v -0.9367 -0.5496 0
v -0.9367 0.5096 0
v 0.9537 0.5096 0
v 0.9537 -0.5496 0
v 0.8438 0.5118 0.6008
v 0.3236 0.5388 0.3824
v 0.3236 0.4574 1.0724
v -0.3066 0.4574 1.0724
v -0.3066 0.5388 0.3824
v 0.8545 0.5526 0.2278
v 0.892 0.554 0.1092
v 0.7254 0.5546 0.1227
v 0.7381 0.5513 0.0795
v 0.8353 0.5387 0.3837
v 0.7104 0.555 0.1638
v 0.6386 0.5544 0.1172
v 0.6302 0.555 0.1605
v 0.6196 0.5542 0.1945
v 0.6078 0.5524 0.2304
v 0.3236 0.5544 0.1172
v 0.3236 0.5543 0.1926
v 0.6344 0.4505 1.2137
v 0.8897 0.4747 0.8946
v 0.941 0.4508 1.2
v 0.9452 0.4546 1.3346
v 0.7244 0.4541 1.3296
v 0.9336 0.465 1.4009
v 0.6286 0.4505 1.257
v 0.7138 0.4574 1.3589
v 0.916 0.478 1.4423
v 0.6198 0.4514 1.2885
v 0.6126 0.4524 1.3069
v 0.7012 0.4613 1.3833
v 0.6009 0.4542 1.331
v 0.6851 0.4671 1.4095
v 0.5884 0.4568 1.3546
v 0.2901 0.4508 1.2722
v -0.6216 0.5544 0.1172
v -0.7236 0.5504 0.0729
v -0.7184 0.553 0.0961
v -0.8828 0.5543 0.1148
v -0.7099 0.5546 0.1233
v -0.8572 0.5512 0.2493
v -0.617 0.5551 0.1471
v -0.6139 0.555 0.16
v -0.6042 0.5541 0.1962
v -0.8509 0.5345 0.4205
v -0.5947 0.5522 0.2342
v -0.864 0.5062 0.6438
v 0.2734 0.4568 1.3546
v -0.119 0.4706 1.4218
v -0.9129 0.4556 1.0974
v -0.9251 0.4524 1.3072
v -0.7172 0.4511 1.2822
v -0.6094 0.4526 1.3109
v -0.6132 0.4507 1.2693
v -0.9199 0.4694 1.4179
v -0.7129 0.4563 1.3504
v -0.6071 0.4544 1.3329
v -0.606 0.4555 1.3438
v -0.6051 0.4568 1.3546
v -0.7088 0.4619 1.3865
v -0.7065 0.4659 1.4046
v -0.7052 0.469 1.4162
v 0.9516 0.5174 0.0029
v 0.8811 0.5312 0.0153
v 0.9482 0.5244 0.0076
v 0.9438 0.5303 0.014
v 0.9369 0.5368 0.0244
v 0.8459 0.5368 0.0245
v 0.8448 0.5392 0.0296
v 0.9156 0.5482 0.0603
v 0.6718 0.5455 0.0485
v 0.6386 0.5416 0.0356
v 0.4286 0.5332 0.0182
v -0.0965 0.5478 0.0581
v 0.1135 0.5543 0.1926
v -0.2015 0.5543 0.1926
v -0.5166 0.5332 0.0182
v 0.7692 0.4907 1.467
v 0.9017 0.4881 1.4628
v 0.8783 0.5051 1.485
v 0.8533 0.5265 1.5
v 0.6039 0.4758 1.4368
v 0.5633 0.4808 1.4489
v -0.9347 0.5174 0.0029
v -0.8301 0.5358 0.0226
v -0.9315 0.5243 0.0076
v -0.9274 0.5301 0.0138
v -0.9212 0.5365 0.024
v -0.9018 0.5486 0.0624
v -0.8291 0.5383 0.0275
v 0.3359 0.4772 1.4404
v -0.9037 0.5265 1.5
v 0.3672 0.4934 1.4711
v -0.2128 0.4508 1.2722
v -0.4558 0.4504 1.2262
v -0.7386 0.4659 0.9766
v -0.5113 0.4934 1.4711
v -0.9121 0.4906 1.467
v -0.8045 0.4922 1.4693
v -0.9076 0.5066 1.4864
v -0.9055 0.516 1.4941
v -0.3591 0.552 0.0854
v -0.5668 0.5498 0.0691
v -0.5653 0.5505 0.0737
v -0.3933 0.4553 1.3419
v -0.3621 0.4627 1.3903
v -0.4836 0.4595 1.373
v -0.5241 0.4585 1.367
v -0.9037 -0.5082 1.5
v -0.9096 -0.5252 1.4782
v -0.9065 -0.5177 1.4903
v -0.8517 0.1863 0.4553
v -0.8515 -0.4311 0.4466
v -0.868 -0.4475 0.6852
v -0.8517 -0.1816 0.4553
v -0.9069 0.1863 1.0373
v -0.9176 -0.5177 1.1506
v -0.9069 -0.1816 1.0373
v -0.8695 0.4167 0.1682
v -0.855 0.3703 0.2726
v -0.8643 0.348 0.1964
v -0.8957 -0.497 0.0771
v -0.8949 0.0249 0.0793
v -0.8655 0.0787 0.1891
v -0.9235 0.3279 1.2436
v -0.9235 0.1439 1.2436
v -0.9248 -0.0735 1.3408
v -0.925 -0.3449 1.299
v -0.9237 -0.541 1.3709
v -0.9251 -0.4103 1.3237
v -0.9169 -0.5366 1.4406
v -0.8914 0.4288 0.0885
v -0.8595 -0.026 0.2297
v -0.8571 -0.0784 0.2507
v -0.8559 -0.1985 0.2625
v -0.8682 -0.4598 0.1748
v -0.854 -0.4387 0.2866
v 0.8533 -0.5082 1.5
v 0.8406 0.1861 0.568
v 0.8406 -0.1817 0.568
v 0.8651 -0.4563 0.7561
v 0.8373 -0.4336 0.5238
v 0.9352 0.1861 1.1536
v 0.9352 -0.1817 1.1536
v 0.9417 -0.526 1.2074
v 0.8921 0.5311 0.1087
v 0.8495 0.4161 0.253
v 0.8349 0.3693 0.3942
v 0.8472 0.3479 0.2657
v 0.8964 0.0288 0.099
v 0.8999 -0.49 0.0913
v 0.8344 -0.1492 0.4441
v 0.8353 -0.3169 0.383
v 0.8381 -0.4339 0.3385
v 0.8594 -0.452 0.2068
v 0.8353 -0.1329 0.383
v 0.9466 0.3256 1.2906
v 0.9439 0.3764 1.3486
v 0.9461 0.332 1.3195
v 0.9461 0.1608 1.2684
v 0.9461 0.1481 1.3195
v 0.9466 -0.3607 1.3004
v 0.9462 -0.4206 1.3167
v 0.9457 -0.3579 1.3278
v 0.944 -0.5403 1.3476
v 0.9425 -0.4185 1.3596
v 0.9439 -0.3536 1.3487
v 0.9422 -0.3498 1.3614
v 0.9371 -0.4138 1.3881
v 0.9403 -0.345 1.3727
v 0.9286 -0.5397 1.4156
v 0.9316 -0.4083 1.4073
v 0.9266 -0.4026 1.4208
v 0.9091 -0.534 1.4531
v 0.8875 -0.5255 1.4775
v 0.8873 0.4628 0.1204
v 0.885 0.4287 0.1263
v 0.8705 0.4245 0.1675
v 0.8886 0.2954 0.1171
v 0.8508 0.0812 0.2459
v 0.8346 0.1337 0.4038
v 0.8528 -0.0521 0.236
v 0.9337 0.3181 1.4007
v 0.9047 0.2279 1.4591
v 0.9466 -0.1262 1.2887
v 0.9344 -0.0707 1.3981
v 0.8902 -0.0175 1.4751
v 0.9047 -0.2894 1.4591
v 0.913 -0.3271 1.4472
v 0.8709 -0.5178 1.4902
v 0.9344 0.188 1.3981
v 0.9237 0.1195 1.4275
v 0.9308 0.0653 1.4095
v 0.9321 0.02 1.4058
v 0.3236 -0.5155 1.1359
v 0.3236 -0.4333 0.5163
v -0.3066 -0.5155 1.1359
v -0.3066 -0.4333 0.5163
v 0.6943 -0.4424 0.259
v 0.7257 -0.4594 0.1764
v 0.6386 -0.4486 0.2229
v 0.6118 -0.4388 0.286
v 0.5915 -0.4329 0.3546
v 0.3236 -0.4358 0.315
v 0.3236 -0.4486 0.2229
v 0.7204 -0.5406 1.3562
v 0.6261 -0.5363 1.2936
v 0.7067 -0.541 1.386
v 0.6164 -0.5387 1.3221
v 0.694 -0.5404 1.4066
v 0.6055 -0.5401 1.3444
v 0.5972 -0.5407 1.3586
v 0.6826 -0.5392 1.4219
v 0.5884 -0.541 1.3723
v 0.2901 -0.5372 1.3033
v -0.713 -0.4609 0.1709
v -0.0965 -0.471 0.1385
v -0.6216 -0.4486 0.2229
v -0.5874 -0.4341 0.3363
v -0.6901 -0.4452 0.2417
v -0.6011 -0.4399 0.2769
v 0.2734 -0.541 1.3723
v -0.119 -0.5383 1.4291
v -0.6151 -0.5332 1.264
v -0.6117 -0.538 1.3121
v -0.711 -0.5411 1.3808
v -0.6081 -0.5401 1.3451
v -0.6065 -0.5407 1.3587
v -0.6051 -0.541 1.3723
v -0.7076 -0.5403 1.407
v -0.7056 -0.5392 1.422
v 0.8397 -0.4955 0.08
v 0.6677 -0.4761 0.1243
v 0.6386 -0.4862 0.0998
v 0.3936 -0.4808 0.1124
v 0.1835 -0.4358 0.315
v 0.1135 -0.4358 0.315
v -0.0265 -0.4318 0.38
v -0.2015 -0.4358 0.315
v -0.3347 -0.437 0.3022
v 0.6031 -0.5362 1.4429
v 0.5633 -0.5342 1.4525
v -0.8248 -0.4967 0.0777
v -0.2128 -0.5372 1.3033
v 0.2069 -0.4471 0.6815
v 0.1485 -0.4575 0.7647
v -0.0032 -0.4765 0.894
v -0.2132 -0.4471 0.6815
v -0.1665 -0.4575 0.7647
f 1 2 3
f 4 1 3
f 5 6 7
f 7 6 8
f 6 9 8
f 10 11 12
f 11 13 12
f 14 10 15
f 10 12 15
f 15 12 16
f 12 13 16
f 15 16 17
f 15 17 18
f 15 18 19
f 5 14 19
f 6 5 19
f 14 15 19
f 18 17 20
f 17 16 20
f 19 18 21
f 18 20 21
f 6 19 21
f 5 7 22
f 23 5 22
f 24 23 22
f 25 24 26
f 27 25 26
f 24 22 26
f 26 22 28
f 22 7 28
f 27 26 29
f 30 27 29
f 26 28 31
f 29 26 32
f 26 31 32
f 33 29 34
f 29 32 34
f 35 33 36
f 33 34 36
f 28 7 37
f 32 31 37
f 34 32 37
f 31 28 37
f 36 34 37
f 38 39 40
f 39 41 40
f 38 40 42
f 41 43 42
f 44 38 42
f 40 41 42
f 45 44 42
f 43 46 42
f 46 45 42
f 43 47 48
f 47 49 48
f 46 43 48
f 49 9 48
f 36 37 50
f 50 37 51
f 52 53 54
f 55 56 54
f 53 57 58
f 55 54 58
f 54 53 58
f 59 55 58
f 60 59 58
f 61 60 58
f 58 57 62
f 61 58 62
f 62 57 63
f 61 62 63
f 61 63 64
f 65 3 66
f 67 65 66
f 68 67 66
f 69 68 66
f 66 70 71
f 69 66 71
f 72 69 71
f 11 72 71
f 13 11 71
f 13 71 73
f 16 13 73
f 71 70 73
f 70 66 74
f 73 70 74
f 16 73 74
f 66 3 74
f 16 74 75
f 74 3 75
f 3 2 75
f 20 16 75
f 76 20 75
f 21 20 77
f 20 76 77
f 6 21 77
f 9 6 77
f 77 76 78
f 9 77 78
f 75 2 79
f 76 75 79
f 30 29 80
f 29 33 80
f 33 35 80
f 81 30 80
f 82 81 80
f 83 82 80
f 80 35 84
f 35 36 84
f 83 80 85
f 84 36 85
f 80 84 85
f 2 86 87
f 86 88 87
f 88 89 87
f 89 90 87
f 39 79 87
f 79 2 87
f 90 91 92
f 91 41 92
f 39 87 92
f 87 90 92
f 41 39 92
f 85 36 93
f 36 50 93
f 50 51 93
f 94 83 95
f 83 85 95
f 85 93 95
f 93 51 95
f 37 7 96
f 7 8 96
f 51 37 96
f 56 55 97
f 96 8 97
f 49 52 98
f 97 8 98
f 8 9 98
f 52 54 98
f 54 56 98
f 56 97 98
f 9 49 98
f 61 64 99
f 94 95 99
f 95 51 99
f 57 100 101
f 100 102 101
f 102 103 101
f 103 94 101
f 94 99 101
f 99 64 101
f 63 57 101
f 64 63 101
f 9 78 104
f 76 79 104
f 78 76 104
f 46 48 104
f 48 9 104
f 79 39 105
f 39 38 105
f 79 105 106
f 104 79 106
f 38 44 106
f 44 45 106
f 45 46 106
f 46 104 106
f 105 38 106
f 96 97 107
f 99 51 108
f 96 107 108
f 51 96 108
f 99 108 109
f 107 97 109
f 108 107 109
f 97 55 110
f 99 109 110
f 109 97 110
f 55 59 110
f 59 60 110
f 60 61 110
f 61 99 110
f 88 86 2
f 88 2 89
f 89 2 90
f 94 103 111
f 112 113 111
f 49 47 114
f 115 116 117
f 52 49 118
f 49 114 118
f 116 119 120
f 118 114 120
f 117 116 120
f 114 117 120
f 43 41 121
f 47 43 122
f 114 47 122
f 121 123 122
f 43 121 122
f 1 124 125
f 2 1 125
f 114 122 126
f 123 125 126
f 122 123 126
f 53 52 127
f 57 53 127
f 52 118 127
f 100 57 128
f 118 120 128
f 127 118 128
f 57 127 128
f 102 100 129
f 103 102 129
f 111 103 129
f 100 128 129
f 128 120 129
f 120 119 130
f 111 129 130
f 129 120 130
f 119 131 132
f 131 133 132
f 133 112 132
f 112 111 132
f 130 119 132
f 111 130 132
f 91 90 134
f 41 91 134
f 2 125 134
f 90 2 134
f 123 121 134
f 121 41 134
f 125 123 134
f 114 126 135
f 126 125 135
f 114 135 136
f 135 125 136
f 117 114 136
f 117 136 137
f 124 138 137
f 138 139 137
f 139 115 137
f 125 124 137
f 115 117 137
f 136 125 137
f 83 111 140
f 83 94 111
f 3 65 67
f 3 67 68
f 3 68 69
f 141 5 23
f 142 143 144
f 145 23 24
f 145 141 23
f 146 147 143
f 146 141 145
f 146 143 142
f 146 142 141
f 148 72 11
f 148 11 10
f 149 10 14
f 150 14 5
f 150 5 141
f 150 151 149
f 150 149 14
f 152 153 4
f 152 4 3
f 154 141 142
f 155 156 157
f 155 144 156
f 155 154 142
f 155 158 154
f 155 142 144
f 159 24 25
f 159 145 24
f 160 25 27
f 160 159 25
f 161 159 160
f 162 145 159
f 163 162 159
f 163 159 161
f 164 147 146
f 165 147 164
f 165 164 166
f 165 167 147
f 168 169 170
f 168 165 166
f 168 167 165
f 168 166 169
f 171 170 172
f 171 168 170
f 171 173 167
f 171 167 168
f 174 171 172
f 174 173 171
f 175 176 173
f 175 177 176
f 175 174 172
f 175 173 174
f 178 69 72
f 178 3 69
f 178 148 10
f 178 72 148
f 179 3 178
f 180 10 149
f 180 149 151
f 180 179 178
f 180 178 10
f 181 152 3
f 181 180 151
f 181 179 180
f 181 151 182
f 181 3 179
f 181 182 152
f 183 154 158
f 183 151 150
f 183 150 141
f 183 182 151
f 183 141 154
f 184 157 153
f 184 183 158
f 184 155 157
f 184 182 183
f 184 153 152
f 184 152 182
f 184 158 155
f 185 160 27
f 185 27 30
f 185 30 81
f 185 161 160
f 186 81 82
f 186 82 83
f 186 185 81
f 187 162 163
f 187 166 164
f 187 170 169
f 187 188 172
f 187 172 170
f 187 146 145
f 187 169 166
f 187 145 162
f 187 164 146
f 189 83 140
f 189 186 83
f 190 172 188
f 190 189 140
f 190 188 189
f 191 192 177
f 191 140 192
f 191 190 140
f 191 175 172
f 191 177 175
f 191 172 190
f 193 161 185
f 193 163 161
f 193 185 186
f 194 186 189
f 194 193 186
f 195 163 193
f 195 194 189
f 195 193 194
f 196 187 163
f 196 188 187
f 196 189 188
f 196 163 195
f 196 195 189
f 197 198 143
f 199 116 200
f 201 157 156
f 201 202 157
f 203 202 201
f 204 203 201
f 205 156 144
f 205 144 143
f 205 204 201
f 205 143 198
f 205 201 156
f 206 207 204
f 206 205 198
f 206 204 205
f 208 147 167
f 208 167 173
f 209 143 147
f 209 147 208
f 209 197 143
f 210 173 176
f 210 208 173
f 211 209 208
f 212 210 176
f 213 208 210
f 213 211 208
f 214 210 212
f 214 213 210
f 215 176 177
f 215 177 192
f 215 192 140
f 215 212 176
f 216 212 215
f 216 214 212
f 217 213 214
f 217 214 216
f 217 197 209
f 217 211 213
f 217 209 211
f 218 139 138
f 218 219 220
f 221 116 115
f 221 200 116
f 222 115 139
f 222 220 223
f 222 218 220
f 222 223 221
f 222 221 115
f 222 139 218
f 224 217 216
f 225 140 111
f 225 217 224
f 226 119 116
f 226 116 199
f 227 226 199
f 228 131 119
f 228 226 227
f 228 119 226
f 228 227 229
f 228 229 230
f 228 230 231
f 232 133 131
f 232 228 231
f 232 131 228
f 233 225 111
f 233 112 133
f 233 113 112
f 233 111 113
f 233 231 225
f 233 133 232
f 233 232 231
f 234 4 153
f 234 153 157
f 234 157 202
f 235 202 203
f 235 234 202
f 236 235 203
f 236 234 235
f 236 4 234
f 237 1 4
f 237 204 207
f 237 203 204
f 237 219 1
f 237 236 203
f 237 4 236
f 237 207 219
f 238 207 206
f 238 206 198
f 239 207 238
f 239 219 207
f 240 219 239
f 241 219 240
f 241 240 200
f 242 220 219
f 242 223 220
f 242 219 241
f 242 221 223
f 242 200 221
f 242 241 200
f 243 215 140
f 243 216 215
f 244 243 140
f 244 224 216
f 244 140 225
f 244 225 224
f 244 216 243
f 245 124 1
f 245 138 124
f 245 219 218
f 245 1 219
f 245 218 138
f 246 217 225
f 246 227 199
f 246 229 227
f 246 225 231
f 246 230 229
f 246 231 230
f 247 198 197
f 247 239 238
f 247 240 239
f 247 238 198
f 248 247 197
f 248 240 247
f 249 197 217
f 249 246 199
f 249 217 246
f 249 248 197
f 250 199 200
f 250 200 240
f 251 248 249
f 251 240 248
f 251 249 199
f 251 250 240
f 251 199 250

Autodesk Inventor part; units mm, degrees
ref_plane "YZ Plane" through (0, 0, 0) normal (1, 0, 0) x (0, 1, 0)
ref_plane "XZ Plane" through (0, 0, 0) normal (0, 1, 0) x (-1, 0, 0)
ref_plane "XY Plane" through (0, 0, 0) normal (0, 0, 1) x (1, 0, 0)
sketch "Эскиз1" plane through (0, 0, 0) normal (0, 0, 1) x (1, 0, 0)
  line L0 (-1, -0.6) -> (1, -0.6)
  line L1 (1, -0.6) -> (1, 0.6)
  line L2 (1, 0.6) -> (-1, 0.6)
  line L3 (-1, 0.6) -> (-1, -0.6)
  line L4 (-0.25, -0.4) -> (-0.25, 0.4) projected
  line L5 (-0.25, 0.4) -> (-0.8, 0.4) projected
  line L6 (-0.8, 0.4) -> (-0.8, -0.4) projected
  line L7 (-0.8, -0.4) -> (-0.25, -0.4) projected
  line L8 (0.25, 0.4) -> (0.25, -0.4) projected
  line L9 (0.25, -0.4) -> (0.8, -0.4) projected
  line L10 (0.8, -0.4) -> (0.8, 0.4) projected
  line L11 (0.8, 0.4) -> (0.25, 0.4) projected
  point P0 (0, 0)
  dimension "d0" = 0.2
  dimension "d1" = 0.2
  dimension "d2" = 0.2
  dimension "d3" = 0.2
extrude "Выдавливание1" add sketch "Эскиз1" along normal blind 1.5 contours L3 L2 L1 L0 | L7 L6 L5 L4 | L11 L10 L9 L8
ref_plane "РабПлоскость1" through (-1, -0.6, 0) normal (0, -1, 0) x (1, 0, 0)
ref_plane "РабПлоскость2" through (-1, 0.6, 0) normal (-1, 0, 0) x (0, -1, 0)
sketch "Эскиз2" plane through (-1, -0.6, 0) normal (0, -1, 0) x (1, 0, 0)
  line L0 (2, 1.5) -> (0, 1.5) projected
  line L1 (0, 0) -> (0, 1.5) projected
  line L2 (0, 0) -> (2, 0) projected
  line L3 (2, 0) -> (2, 1.5) projected
  spline S0 degree 3 poles (1.9537, 0) (1.6088, 0.4735) (2.1515, 1.3588) (1.8533, 1.5) knots 0 0 0 0 1 1 1 1
  spline S1 degree 3 poles (0.0633, 0) (0.2846, 0.3099) (-0.0024, 1.179) (0.0963, 1.5) knots 0 0 0 0 1 1 1 1
  point P0 (1, 0)
  point P1 (1.8557, 0.6949)
  point P2 (1.9464, 1.311)
  point P3 (0.1493, 0.4099)
  point P4 (0.0882, 1.0857)
extrude "Выдавливание2" cut sketch "Эскиз2" against normal through all contours L3 L2 S0 L0 | S1 L2 L1 L0
sketch "Эскиз3" plane through (-1, 0.6, 0) normal (-1, 0, 0) x (0, -1, 0)
  line L0 (0, 0) -> (0, 1.5) projected
  line L1 (1.2, 0) -> (0, 0) projected
  line L2 (1.2, 1.5) -> (1.2, 0) projected
  line L3 (0, 1.5) -> (1.2, 1.5) projected
  spline S0 degree 3 poles (1.1496, 0) (0.838, 0.3452) (1.2562, 1.3831) (1.1082, 1.5) knots 0 0 0 0 1 1 1 1
  spline S1 degree 3 poles (0.0904, 0) (-0.0812, 0.0387) (0.3049, 1.3936) (0.0735, 1.5) knots 0 0 0 0 1 1 1 1
  point P0 (0.6, 0)
  point P1 (1.0399, 0.6111)
  point P2 (1.1392, 1.3283)
  point P3 (0.0452, 0.1765)
  point P4 (0.1462, 1.1268)
extrude "Выдавливание3" cut sketch "Эскиз3" against normal through all contours L0 L3 S1 L1 | S0 L3 L2 L1
properties part number "0603 board"
